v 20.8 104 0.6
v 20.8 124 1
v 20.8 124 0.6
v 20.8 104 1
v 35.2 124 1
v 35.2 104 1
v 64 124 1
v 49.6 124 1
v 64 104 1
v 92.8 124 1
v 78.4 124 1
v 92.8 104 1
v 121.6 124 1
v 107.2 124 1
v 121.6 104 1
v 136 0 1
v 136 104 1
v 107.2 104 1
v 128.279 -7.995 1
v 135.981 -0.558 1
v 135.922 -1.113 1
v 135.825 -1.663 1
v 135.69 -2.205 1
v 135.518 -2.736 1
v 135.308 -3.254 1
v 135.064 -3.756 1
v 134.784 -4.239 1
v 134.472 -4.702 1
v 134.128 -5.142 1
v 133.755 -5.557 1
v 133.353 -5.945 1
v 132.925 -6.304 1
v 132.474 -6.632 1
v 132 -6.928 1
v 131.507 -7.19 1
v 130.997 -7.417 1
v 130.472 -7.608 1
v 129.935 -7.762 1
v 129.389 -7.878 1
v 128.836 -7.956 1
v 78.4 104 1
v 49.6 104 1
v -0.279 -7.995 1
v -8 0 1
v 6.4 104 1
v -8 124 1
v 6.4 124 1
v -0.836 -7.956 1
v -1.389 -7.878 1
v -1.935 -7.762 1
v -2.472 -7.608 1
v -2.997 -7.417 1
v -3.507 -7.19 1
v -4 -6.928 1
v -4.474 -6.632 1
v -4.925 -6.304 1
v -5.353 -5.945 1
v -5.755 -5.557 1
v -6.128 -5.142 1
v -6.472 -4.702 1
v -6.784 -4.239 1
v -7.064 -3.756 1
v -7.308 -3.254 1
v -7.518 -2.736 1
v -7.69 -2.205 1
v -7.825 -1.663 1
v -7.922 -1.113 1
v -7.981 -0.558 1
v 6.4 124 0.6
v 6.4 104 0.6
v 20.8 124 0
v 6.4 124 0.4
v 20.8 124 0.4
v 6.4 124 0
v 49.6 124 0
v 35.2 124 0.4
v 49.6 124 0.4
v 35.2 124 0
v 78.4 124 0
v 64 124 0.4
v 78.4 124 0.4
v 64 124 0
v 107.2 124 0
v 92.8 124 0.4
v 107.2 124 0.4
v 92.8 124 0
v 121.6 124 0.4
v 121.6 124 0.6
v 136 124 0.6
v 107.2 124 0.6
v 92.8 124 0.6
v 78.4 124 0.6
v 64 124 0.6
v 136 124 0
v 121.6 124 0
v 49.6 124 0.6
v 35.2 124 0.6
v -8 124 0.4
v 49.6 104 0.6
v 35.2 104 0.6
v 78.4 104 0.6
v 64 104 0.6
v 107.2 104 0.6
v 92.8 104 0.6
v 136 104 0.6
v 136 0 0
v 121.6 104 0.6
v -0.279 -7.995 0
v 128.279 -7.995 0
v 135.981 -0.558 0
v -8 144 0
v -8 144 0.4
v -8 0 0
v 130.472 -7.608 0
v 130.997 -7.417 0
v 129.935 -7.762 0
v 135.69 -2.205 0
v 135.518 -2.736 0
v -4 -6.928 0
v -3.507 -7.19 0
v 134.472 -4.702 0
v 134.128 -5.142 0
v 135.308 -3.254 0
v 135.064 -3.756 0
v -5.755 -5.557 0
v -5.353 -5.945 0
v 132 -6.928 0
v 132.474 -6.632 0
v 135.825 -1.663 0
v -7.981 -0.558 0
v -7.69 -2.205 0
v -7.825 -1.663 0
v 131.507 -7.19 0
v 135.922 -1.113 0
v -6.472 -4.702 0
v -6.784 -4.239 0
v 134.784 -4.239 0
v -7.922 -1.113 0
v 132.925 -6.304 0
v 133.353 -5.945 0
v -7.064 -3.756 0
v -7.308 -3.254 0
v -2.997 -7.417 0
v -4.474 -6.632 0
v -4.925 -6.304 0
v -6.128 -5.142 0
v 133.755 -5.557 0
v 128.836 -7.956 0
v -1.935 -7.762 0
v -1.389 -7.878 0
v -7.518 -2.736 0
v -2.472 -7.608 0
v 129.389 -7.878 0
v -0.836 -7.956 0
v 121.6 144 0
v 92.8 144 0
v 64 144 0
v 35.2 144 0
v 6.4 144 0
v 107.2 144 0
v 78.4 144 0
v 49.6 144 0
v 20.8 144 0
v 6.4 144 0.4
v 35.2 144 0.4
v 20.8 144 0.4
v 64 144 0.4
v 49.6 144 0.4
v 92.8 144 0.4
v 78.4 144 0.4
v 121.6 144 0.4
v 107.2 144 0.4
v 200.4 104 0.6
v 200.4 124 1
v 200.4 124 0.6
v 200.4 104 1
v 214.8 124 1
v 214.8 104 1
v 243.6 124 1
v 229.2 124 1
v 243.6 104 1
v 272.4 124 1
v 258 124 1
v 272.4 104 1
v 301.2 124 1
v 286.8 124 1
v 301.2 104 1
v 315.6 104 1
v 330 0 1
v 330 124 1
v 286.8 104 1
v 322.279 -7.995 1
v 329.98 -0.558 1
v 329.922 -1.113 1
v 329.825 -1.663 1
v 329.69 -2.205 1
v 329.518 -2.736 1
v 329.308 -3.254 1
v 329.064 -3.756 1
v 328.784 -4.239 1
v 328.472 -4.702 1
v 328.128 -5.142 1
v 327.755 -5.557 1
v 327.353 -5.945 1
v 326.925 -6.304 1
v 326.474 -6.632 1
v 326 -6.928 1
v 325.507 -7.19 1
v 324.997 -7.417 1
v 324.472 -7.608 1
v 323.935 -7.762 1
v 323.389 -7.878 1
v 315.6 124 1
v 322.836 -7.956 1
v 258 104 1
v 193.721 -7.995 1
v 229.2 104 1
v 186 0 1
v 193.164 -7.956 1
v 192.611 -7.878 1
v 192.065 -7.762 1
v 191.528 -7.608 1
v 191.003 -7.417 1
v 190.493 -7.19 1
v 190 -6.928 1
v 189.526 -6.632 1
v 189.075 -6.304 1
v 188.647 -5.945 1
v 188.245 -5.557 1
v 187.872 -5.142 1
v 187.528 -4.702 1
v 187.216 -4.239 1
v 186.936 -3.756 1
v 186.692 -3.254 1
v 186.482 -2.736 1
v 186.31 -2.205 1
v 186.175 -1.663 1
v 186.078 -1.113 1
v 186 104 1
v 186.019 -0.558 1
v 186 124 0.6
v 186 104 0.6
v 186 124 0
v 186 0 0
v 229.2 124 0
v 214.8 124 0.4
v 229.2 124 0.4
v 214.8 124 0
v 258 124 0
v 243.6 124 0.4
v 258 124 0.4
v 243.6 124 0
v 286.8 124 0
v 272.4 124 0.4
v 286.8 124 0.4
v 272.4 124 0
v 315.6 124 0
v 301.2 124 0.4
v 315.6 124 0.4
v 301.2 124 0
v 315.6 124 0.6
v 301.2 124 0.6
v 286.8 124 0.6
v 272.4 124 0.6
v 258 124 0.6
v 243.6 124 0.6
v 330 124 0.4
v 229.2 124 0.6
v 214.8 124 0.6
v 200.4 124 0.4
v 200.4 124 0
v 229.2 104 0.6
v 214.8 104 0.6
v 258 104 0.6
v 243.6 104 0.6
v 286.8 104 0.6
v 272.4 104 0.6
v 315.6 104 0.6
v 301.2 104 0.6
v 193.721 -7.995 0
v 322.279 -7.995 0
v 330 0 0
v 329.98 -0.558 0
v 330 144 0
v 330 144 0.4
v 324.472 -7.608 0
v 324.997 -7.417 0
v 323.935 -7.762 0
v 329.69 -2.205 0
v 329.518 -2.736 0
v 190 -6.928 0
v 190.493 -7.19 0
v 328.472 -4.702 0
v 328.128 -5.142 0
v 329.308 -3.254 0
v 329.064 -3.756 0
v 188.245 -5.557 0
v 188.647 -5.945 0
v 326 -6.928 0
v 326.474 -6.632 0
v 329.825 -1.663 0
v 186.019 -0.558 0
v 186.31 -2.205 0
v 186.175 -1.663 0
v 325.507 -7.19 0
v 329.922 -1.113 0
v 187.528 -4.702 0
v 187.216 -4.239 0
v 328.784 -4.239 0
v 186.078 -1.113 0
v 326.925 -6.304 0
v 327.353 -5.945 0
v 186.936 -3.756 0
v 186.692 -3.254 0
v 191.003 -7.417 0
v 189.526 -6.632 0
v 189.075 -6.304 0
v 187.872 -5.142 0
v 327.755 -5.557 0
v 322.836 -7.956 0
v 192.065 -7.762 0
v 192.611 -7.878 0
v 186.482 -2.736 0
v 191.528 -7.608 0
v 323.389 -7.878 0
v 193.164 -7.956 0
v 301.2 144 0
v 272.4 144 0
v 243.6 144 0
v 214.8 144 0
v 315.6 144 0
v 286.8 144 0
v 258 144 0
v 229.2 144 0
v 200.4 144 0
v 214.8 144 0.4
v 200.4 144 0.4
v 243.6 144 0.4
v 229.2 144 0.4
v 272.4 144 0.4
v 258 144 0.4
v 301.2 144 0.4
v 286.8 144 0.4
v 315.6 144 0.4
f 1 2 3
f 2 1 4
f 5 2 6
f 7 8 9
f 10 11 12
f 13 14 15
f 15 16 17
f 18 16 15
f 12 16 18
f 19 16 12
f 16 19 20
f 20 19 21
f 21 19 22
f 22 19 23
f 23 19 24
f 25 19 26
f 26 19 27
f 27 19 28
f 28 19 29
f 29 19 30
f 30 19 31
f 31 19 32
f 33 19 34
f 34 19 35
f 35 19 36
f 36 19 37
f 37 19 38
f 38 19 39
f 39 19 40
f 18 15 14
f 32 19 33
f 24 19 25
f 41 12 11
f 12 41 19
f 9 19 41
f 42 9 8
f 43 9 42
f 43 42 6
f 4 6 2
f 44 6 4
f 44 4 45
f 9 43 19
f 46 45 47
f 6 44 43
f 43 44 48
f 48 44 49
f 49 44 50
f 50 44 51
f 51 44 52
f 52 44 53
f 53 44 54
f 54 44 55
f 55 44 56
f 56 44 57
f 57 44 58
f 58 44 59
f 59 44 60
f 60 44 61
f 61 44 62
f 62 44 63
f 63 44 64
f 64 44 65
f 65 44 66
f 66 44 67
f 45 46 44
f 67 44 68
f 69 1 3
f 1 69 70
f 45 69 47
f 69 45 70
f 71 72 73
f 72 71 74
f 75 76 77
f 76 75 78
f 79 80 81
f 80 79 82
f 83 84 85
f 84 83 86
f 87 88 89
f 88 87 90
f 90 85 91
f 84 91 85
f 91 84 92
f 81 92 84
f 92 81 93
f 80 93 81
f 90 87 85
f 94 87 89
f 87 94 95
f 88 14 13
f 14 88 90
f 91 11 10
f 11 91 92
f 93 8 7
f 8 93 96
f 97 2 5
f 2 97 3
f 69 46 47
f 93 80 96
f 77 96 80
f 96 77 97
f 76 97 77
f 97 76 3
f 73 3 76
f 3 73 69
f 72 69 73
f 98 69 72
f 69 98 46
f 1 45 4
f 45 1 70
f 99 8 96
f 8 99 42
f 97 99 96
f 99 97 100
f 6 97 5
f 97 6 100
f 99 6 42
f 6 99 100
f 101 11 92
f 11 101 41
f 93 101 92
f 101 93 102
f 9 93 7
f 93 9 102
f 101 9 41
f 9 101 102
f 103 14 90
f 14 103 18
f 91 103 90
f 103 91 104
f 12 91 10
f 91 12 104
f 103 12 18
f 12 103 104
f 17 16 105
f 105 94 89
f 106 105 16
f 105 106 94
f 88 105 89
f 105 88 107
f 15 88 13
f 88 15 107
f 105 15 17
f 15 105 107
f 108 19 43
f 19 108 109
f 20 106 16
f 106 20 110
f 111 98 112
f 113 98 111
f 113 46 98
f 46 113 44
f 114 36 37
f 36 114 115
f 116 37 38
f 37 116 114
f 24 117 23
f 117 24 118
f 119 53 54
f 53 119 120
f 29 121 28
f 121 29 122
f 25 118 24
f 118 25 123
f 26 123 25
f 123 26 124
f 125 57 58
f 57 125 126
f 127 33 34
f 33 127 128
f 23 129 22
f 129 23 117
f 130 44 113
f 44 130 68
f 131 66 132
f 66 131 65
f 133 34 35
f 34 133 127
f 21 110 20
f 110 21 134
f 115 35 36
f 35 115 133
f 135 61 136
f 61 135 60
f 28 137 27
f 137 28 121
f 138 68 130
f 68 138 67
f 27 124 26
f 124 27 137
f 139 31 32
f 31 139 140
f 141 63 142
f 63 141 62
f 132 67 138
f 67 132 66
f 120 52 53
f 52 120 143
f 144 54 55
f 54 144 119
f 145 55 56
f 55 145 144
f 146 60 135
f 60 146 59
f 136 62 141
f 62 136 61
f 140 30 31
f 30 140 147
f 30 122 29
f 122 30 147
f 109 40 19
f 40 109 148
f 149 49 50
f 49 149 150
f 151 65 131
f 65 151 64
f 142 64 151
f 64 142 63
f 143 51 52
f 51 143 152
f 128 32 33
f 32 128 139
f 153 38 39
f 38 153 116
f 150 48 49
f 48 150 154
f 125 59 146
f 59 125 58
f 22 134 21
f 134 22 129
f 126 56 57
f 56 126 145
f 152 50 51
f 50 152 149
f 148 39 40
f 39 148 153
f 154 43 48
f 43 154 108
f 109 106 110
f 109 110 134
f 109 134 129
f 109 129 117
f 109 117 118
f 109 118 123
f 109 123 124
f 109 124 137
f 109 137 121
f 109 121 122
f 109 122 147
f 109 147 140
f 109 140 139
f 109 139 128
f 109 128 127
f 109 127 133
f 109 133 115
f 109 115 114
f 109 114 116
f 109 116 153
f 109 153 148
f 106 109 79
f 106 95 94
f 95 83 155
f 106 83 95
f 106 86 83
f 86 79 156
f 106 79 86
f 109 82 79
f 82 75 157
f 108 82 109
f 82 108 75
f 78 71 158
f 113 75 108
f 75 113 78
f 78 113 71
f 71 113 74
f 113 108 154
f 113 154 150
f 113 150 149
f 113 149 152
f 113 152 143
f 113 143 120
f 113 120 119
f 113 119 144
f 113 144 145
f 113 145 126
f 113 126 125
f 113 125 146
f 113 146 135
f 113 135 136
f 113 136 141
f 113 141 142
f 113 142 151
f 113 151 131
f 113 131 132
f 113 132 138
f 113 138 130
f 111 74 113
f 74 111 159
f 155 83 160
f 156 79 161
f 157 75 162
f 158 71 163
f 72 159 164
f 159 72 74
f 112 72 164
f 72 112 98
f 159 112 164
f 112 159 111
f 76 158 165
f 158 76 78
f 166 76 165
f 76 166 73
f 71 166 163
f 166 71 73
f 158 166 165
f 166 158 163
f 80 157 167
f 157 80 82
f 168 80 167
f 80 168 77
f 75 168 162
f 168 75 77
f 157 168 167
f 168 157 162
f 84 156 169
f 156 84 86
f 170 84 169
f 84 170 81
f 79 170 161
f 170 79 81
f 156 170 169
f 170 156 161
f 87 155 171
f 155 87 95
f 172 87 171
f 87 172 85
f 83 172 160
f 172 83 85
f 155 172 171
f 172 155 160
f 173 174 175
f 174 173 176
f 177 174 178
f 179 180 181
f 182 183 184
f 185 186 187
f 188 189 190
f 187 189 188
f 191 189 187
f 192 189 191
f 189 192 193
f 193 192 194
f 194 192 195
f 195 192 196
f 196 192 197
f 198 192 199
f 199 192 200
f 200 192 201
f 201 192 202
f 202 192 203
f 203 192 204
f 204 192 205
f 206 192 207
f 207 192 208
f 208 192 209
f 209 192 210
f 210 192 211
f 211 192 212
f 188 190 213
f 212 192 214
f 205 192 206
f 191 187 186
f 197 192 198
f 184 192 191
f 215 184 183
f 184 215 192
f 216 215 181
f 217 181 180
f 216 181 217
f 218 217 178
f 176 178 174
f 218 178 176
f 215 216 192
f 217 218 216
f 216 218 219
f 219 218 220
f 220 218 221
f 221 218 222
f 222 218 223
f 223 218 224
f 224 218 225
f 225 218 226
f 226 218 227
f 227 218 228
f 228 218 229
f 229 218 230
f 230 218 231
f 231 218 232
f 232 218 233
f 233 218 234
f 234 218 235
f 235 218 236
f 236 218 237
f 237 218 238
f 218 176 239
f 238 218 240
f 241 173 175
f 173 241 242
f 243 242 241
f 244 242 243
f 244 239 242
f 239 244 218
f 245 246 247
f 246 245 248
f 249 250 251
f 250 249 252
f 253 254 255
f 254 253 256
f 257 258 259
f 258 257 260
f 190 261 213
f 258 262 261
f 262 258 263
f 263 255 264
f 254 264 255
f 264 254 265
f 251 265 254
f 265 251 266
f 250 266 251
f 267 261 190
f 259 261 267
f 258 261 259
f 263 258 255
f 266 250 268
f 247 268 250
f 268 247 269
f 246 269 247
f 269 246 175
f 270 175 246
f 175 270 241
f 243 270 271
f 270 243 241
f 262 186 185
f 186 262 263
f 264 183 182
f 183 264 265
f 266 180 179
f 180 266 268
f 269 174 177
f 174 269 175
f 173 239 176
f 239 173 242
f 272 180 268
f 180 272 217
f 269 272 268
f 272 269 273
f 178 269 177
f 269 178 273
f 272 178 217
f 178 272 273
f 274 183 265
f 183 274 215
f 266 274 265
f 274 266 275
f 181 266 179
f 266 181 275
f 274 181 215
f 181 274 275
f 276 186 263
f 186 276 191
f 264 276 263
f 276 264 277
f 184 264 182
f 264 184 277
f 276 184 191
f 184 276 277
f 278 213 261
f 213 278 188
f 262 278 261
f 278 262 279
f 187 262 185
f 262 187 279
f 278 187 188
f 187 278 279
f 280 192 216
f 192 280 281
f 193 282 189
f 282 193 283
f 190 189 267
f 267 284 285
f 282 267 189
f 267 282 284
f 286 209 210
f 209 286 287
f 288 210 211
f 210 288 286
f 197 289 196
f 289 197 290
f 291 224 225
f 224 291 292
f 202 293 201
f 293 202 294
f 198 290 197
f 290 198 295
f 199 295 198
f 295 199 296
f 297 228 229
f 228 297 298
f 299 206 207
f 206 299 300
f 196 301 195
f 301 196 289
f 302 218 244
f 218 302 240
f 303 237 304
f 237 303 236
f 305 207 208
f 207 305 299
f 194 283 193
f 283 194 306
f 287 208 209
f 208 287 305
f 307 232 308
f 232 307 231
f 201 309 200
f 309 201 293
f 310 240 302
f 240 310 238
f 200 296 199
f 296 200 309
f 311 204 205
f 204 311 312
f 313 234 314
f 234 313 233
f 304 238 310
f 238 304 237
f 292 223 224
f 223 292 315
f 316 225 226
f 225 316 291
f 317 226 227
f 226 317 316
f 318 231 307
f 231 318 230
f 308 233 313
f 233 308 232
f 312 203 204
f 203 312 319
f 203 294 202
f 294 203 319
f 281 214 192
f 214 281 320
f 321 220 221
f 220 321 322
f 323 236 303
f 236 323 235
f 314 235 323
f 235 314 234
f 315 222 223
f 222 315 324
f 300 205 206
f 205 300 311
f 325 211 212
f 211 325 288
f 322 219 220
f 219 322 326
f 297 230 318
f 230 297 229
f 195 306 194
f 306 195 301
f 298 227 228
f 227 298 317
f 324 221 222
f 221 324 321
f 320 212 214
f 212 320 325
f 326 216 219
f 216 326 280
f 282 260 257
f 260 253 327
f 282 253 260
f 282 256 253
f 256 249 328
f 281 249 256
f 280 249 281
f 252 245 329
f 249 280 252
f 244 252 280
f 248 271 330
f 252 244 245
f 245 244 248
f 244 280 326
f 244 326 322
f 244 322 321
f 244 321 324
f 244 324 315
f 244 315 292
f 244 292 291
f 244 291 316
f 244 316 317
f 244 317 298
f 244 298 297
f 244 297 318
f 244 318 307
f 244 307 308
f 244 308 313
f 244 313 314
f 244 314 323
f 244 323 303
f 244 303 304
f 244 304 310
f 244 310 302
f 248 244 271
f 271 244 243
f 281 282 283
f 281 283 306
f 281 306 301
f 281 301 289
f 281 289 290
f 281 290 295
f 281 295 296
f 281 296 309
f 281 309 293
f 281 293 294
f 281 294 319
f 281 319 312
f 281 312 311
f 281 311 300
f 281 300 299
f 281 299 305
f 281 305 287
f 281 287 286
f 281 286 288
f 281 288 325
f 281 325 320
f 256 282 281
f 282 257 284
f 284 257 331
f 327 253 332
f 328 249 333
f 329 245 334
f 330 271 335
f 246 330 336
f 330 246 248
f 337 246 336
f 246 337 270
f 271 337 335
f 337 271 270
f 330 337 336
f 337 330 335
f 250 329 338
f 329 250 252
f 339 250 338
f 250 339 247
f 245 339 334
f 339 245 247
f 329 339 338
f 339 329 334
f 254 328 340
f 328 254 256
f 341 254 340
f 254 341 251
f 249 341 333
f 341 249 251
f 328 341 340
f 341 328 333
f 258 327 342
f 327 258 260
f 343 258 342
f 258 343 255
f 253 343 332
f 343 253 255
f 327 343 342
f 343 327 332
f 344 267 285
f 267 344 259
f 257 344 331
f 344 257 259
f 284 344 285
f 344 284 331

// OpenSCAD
/*
 * Zalman S2 Dust Cover
 *
 * Author: Pavel Rampas
 * Version: 1.0.0 (Changelog is at the bottom)
 * License: CC BY-SA 4.0 [https://creativecommons.org/licenses/by-sa/4.0/]
 * Link: https://github.com/pavelrampas/openscad-models
 *
 * OpenSCAD version: 2021.01
 *
 * Instructions:
 * Set up parameters, render and print.
 *
 * Height is layer.
 * Thickness is perimeter.
 */

// Parameters
//------------------------------------------------------------------------------

$fn = $preview ? 15 : 90;

height = 1;
cornerR = 8;
width = 144;
length = 264;

teethNumber = 10;
teethLength = 20;
teethHeight = 0.4;

// Code
//------------------------------------------------------------------------------

// first
_half_part(true);

//second
translate([width + 50, 0, 0]) {
    _half_part(false);
}

// Functions
//------------------------------------------------------------------------------

function _isOdd(x) = (x % 2) == 1;

// Modules
//------------------------------------------------------------------------------

module _half_part(teethLeft) {
    difference() {
        hull() {
            cylinder(h = height, r1 = cornerR, r2 = cornerR);
            translate([width - (2 * cornerR), 0, 0]) {
                cylinder(h = height, r1 = cornerR, r2 = cornerR);
            }
            translate([-cornerR, (length / 2) - (1 + cornerR), 0]) {
                cube([width, 1, height]);
            }
        }
        for(i = [0 : teethNumber - 1]) {
            translate([
                (i * width / teethNumber ) + (-cornerR),
                (length / 2) - (cornerR + teethLength),
                1 - teethHeight
            ]) {
                if (_isOdd(i) == teethLeft) {
                    cube([width / teethNumber, teethLength, teethHeight]);
                }
            }
        }
    }
    for(i = [0 : teethNumber - 1]) {
        translate([
            (i * width / teethNumber ) + (-cornerR),
            (length / 2) - cornerR,
            0
        ]) {
            if (_isOdd(i) != teethLeft) {
                cube([width / teethNumber, teethLength, teethHeight]);
            }
        }
    }
}

// Changelog
//------------------------------------------------------------------------------

// [1.0.0]:
// Initial release.
